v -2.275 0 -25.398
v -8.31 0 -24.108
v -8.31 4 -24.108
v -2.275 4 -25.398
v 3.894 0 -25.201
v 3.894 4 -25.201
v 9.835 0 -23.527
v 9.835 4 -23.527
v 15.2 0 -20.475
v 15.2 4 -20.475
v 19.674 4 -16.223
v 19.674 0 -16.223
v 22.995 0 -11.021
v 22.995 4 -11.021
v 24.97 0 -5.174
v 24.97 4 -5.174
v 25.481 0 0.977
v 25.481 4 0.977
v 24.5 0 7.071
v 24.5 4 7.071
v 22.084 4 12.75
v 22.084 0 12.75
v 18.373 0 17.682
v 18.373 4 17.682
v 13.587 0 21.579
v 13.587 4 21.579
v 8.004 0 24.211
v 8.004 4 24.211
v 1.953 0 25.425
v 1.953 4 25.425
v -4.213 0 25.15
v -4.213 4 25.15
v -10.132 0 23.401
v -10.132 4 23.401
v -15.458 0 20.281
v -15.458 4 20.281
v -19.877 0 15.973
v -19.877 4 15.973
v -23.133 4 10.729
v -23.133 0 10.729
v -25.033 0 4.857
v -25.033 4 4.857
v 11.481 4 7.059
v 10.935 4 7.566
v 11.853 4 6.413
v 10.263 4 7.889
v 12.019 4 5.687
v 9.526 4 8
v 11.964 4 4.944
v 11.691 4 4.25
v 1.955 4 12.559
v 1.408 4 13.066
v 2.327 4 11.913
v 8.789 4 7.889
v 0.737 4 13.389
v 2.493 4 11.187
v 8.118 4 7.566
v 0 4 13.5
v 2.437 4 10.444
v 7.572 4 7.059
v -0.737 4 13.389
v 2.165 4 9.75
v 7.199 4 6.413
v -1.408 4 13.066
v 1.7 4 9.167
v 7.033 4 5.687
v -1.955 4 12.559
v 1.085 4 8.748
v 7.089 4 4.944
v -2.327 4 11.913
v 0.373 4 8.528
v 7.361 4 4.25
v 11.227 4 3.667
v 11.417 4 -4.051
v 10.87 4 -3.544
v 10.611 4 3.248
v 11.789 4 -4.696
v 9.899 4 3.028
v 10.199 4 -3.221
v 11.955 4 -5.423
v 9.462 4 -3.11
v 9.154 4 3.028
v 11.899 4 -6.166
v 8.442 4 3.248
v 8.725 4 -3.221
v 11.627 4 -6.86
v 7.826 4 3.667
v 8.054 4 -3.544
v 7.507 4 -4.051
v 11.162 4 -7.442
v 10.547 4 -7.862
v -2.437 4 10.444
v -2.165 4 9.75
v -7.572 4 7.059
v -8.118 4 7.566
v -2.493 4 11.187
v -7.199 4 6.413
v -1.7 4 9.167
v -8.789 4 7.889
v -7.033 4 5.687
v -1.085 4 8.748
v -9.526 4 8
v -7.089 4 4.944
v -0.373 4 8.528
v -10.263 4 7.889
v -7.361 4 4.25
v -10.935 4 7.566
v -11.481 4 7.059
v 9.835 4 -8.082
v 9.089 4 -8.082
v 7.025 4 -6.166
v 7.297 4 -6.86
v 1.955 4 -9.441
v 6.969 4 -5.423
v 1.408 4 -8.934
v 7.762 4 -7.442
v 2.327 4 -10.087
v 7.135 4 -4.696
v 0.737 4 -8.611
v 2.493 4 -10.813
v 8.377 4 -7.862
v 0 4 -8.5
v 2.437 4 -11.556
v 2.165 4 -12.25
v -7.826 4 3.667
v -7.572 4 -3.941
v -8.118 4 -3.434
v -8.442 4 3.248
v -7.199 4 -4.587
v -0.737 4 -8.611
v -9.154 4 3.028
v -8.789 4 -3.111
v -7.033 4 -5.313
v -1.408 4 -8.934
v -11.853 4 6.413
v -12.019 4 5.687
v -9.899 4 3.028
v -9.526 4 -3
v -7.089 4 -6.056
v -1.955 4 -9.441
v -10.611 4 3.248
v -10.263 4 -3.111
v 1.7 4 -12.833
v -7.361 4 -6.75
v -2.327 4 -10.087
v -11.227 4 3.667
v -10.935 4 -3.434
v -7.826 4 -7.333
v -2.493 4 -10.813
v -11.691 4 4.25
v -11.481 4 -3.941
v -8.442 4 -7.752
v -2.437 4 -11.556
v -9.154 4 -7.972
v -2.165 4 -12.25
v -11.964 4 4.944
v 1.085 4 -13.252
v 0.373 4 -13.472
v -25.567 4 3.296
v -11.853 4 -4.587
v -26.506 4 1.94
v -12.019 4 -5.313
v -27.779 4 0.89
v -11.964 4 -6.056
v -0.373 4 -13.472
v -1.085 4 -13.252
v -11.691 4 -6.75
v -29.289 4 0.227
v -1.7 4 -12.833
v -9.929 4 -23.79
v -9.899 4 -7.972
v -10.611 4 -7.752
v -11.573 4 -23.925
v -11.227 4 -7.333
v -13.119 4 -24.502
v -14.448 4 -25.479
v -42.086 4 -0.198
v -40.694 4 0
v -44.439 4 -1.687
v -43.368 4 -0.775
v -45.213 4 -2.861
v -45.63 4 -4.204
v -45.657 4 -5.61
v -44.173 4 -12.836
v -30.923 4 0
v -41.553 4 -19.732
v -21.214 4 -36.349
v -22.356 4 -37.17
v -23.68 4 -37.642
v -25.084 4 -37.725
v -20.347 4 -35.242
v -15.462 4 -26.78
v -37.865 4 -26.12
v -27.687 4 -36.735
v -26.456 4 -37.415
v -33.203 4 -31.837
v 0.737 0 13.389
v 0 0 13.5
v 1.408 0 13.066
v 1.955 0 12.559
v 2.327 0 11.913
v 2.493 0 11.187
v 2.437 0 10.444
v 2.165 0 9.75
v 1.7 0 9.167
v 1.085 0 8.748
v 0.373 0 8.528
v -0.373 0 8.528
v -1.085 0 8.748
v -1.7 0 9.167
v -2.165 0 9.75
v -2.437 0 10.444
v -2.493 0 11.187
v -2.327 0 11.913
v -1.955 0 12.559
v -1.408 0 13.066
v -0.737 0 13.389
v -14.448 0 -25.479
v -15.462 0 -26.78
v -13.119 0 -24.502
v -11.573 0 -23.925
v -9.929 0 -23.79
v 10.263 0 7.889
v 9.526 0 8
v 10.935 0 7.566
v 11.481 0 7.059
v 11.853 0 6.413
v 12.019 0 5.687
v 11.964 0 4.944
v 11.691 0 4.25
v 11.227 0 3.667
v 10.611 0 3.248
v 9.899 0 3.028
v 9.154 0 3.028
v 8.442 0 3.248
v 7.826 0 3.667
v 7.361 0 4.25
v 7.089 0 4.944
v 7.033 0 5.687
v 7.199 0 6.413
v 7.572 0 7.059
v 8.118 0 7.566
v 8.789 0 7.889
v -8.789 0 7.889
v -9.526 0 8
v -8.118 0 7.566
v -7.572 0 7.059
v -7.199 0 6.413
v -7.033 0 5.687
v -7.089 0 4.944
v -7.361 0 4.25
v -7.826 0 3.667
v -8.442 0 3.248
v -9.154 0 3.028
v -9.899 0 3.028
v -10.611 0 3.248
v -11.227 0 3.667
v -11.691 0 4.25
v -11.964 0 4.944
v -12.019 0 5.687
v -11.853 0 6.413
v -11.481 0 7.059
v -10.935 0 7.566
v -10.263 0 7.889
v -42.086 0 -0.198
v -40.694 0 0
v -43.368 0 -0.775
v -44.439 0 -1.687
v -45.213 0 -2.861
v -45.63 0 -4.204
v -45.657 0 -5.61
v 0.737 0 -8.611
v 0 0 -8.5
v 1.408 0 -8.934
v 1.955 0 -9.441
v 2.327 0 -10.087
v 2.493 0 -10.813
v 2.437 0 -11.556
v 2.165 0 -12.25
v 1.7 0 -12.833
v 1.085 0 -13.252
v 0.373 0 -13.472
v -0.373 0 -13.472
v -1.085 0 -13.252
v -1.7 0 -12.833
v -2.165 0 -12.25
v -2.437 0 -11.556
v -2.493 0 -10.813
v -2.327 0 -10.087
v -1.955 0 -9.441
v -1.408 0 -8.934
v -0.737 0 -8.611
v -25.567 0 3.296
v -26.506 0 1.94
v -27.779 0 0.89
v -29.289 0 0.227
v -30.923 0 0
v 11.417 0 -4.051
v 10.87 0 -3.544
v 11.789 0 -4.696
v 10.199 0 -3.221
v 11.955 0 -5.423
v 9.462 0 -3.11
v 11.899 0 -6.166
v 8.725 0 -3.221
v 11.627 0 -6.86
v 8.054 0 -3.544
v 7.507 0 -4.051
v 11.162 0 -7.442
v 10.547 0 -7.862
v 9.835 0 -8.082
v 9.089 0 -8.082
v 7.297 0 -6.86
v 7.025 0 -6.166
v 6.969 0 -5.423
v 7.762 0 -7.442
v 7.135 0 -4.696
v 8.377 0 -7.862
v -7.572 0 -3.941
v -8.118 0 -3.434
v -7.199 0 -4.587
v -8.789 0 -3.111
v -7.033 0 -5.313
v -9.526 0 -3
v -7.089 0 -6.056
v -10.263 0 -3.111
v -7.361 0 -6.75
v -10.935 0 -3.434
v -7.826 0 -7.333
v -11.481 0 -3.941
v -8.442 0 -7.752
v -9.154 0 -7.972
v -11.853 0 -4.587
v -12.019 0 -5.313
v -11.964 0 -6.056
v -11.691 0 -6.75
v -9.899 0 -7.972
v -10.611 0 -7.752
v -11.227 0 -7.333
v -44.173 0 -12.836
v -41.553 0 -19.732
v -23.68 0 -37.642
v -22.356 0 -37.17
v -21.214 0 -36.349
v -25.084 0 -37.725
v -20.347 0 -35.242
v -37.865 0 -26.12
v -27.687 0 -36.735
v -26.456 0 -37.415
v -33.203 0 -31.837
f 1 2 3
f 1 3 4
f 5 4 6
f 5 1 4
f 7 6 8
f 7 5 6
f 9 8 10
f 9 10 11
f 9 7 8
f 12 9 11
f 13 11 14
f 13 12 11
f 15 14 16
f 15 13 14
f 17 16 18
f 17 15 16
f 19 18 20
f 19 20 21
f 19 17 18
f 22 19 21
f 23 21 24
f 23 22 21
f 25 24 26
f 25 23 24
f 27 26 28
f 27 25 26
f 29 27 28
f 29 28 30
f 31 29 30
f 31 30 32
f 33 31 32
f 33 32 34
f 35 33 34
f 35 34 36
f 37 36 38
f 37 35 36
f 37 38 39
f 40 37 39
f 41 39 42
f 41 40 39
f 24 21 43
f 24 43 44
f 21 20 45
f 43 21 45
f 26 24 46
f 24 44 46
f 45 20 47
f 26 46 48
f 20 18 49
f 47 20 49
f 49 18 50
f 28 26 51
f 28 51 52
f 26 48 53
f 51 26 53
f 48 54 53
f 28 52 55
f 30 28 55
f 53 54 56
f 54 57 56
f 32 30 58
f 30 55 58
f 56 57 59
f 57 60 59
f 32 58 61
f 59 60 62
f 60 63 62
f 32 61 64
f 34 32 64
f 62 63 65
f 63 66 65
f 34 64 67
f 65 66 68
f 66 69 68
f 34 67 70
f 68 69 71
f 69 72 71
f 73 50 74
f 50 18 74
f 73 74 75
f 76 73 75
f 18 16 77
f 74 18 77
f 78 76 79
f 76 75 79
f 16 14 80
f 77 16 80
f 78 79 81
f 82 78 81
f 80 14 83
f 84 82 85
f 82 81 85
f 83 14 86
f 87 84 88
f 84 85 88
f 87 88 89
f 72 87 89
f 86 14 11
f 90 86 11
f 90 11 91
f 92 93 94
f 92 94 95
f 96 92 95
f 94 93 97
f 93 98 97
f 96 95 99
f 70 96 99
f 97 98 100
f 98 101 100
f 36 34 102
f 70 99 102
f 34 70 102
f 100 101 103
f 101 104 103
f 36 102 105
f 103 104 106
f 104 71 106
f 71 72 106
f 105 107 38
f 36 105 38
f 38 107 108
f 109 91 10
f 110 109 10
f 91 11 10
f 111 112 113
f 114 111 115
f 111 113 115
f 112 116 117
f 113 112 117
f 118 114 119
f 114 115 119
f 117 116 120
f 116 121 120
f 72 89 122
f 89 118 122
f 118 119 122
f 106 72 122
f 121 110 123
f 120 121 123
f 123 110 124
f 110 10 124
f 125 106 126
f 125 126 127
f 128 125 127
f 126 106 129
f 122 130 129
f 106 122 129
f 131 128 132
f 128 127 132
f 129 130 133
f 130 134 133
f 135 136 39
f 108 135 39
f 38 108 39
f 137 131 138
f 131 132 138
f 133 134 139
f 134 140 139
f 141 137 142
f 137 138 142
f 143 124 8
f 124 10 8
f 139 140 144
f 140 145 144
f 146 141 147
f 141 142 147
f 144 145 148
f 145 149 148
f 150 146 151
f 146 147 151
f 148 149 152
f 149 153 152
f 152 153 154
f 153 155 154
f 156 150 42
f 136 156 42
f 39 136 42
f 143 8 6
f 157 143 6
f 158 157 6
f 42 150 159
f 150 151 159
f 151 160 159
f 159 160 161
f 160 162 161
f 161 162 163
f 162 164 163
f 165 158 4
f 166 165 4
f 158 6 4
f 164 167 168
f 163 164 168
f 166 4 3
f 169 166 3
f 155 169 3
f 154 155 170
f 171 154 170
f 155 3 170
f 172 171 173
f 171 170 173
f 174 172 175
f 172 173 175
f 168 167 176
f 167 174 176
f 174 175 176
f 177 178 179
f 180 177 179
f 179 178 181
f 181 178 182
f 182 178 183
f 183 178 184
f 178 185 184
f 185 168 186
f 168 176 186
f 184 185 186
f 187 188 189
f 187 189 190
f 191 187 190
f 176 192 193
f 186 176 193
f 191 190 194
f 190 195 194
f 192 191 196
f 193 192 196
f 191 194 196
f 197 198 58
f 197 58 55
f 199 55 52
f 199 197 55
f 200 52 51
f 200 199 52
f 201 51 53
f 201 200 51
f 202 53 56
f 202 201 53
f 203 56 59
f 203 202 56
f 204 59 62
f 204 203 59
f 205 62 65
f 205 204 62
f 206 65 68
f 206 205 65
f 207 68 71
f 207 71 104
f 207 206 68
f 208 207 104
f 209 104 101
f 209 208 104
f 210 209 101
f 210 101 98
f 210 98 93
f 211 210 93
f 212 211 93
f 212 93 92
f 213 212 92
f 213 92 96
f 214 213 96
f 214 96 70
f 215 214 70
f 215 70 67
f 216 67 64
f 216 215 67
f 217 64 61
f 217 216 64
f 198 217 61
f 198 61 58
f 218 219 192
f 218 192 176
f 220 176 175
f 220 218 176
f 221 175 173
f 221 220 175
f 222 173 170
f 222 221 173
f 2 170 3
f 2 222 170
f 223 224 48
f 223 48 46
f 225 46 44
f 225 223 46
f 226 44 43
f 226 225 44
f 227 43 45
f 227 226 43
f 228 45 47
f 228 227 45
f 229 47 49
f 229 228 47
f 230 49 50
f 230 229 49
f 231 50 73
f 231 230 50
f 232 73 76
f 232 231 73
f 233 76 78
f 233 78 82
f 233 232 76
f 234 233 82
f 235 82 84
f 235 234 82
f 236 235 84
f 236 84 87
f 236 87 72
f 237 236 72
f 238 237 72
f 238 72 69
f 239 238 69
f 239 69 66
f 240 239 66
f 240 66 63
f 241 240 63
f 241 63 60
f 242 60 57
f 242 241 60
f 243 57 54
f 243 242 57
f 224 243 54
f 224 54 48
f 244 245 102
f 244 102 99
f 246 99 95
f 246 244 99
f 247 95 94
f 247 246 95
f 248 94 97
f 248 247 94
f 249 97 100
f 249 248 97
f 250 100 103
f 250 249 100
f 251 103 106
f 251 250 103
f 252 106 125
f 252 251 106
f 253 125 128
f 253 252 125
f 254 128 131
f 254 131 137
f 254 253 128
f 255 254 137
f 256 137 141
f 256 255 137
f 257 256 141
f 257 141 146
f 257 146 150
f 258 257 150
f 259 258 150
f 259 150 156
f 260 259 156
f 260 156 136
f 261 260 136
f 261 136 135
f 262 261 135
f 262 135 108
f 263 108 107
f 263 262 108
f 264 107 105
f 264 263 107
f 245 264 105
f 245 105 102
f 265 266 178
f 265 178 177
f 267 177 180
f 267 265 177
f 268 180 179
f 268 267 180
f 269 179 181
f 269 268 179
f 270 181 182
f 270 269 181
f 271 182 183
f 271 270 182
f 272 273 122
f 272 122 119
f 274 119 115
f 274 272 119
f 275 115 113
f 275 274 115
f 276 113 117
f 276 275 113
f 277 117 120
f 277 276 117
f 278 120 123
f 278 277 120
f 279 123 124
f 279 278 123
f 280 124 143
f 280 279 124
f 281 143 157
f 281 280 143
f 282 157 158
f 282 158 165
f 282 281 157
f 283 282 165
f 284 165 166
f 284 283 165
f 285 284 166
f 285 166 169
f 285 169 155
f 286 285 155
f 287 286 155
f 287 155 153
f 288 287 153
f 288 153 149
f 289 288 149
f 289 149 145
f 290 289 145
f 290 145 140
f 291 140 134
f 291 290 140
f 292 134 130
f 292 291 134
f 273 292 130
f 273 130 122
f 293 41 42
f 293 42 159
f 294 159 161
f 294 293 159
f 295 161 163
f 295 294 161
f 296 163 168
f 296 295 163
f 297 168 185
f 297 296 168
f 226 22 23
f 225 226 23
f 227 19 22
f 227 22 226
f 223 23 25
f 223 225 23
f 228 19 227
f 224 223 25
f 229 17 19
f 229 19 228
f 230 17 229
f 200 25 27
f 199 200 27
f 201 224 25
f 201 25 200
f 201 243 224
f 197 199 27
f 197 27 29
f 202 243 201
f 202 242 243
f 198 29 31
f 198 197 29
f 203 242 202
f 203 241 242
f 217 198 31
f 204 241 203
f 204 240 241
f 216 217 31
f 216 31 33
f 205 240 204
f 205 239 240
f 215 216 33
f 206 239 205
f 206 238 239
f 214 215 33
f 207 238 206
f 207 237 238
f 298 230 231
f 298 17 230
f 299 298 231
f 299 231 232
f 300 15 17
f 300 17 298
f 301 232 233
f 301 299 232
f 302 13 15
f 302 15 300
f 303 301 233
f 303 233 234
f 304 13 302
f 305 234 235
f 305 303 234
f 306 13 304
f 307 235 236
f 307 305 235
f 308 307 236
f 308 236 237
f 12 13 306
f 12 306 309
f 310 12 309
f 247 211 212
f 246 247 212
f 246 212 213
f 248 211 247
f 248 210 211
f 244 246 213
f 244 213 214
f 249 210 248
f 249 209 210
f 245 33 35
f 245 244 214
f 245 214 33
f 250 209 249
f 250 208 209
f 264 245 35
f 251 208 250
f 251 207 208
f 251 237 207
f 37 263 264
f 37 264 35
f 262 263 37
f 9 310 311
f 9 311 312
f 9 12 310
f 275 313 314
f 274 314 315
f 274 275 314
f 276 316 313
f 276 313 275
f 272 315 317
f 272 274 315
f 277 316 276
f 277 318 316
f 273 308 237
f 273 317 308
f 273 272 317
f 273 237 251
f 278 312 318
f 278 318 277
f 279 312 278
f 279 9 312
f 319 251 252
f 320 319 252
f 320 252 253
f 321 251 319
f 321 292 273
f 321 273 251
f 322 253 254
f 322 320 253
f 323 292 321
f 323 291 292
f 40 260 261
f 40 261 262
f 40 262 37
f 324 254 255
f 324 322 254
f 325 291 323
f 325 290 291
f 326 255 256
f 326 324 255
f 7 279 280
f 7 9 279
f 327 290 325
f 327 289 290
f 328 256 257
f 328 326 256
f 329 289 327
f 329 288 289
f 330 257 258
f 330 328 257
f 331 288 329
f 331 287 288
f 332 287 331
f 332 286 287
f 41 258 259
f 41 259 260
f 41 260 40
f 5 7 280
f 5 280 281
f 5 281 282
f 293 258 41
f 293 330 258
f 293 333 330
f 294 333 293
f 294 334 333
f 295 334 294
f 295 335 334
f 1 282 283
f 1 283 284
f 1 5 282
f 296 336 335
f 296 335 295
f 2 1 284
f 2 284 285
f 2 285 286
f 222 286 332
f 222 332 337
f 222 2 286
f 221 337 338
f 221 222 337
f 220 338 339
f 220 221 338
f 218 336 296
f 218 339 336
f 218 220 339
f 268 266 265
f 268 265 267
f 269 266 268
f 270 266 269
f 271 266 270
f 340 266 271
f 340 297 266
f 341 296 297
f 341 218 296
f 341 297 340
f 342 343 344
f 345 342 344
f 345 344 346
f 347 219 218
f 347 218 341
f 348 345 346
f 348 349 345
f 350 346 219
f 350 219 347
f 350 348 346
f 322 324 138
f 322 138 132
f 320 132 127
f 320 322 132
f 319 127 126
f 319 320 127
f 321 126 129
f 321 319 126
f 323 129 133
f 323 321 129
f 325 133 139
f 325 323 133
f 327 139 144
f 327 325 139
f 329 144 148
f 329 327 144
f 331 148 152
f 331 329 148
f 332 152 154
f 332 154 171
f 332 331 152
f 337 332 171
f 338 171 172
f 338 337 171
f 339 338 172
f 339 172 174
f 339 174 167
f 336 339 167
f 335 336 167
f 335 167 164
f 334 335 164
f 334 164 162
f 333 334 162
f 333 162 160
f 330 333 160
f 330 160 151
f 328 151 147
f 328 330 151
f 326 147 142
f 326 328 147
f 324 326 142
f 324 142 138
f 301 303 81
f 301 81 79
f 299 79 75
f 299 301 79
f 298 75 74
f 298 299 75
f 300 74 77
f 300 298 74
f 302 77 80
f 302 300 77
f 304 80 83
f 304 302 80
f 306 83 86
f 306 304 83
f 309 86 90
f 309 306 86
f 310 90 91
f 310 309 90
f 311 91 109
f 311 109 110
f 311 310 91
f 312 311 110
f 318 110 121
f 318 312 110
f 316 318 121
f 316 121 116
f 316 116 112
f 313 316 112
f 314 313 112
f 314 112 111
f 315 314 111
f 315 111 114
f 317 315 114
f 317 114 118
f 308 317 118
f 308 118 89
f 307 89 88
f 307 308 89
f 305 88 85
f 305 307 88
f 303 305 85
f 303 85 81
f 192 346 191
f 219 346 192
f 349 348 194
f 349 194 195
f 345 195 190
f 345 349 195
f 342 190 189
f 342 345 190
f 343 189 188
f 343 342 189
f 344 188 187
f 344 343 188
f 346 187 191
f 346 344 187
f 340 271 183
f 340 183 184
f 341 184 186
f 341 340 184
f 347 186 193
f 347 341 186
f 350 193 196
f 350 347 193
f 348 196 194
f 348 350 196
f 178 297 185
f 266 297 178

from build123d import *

# Parameters (mm, degrees)
SKETCH_1_R      = 2.5
EXTRUDE_1_DEPTH = 4


with BuildPart() as part:
    # 草图1 → 凸台-拉伸1 (new body)
    with BuildSketch(Plane(origin=(0, 0, 0), x_dir=(1, 0, 0), z_dir=(0, 1, 0))):
        with BuildLine():
            Line((-20.346989949, 35.242020373), (-15.461646096, 26.780356607))
            ThreePointArc((-15.461646096, 26.780356607), (-12.365785271, 24.159967367), (-8.310161545, 24.10790773))
            ThreePointArc((-8.310161545, 24.10790773), (22.083647797, -12.75), (-25.033141298, -4.857142857))
            ThreePointArc((-25.033141298, -4.857142857), (-27.10603813, -1.370899501), (-30.923292192, 0))
            Line((-30.923292192, 0), (-40.693979899, 0))
            ThreePointArc((-40.693979899, 0), (-44.438895151, 1.687054218), (-45.656660374, 5.609756098))
            ThreePointArc((-45.656660374, 5.609756098), (-39.837168574, 23), (-27.686521477, 36.734949687))
            ThreePointArc((-27.686521477, 36.734949687), (-23.680479385, 37.641685008), (-20.346989949, 35.242020373))
        make_face()
        with Locations(Location((0, 11, 0), (0, 0, 270))):
            Circle(SKETCH_1_R, mode=Mode.SUBTRACT)
        with Locations(Location((9.462063016, 5.609756098, 0), (0, 0, 270))):
            Circle(SKETCH_1_R, mode=Mode.SUBTRACT)
        with Locations(Location((9.526279442, -5.5, 0), (0, 0, 270))):
            Circle(SKETCH_1_R, mode=Mode.SUBTRACT)
        with Locations(Location((0, -11, 0), (0, 0, 270))):
            Circle(SKETCH_1_R, mode=Mode.SUBTRACT)
        with Locations(Location((-9.526279442, -5.5, 0), (0, 0, 270))):
            Circle(SKETCH_1_R, mode=Mode.SUBTRACT)
        with Locations(Location((-9.526279442, 5.5, 0), (0, 0, 270))):
            Circle(SKETCH_1_R, mode=Mode.SUBTRACT)
    extrude(amount=EXTRUDE_1_DEPTH)


solid = part.part
